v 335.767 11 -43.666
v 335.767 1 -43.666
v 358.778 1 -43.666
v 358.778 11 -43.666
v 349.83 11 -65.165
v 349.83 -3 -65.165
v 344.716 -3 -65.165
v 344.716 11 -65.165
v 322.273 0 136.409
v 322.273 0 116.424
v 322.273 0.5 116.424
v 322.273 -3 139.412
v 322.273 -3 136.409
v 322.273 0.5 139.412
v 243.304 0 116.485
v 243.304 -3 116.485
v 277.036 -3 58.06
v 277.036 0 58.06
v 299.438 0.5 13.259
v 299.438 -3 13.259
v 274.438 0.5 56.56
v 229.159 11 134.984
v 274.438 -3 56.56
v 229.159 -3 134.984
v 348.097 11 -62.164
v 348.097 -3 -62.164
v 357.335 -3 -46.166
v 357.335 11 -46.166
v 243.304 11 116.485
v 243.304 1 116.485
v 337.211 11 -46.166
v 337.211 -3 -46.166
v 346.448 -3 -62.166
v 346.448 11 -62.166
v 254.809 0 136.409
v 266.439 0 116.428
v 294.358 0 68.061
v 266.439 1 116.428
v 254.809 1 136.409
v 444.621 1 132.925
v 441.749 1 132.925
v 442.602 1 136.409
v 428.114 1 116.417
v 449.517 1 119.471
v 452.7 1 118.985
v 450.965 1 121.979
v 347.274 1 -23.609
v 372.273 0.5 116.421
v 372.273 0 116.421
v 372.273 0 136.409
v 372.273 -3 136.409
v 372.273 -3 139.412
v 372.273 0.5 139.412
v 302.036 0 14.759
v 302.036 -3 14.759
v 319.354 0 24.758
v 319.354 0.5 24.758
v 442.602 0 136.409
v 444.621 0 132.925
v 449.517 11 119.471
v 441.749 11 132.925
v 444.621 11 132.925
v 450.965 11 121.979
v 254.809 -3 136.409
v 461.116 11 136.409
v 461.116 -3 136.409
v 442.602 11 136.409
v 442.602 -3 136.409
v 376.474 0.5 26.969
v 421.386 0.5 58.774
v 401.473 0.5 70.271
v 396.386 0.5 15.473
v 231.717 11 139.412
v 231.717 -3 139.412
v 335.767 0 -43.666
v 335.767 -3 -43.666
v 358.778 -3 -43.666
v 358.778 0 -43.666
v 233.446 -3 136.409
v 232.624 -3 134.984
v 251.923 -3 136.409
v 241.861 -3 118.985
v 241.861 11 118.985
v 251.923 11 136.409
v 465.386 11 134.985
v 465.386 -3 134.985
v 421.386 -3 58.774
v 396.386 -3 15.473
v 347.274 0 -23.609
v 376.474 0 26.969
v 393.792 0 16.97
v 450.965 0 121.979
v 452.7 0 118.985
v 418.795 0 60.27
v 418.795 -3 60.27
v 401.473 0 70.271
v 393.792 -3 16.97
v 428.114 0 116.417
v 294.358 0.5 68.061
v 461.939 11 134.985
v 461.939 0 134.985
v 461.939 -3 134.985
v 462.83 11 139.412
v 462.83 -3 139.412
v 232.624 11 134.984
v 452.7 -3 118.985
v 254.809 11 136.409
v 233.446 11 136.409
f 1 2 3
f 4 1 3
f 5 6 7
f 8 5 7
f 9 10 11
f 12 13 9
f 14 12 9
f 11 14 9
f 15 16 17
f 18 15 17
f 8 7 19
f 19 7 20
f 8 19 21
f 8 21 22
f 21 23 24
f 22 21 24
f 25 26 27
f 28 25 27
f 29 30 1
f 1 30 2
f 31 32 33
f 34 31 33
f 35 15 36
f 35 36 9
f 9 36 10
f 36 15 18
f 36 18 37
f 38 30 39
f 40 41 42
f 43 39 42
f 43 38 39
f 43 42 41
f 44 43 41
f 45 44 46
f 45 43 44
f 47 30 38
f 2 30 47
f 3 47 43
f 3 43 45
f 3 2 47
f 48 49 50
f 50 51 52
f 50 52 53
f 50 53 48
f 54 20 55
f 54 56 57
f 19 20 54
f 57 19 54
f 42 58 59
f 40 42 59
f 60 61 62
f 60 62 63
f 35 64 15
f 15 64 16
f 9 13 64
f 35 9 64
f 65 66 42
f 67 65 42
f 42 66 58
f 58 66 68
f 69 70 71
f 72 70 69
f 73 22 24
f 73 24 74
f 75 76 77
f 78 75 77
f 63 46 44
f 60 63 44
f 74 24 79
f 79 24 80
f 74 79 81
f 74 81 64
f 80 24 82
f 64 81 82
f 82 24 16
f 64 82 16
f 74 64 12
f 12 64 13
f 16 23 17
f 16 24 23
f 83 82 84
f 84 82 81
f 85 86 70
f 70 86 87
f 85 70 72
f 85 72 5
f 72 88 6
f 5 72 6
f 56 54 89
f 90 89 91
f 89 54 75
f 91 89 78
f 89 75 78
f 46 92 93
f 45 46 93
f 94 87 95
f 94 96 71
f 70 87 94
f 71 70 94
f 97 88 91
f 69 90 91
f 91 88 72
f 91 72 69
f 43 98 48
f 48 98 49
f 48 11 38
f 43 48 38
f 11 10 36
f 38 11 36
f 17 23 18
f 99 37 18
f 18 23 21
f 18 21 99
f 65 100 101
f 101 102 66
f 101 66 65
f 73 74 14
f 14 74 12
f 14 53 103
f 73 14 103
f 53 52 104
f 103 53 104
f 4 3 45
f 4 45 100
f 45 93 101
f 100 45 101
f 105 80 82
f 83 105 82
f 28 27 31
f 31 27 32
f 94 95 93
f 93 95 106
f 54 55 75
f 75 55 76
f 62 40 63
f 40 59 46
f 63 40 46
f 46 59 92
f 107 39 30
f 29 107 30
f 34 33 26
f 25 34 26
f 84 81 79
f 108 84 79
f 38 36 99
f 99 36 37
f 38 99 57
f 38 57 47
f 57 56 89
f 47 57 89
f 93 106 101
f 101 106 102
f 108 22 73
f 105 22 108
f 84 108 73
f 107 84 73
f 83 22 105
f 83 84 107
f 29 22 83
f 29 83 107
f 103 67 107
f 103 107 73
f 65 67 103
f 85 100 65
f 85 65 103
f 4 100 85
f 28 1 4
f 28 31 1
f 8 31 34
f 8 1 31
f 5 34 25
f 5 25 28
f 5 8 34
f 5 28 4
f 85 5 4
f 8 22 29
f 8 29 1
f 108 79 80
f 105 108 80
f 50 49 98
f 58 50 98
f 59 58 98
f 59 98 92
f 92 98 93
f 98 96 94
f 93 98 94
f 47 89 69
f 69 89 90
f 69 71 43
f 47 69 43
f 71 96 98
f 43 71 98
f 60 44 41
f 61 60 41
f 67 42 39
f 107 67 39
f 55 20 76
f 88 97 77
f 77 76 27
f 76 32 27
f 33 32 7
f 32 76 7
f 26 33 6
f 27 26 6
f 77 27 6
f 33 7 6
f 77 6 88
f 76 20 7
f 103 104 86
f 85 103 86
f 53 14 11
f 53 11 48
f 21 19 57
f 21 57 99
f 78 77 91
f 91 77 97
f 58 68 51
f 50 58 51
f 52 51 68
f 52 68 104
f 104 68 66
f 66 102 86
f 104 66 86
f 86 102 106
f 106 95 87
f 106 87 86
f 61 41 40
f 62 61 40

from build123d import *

# Parameters (mm, degrees)
BOSS_EXTRUDE1_DEPTH      = 1
BOSS_EXTRUDE2_DEPTH      = 11
BOSS_EXTRUDE3_DEPTH      = 5
BOSS_EXTRUDE3_DEPTH_BACK = 3
SKETCH3_W                = 50
SKETCH3_H                = 7
CUT_EXTRUDE3_DEPTH       = 25
SKETCH5_W                = 50
SKETCH5_H                = 7
CUT_EXTRUDE4_DEPTH       = 25
SKETCH6_W                = 50
SKETCH6_H                = 7
CUT_EXTRUDE5_DEPTH       = 25


with BuildPart() as part:
    # Sketch1 → Boss-Extrude1 (new body)
    with BuildSketch(Plane(origin=(0, 0, 0), x_dir=(1, 0, 0), z_dir=(0, 1, 0))):
        Polygon((243.304219773, -116.484791866), (254.809280576, -136.408896139), (442.602090749, -136.409305398), (444.621046679, -132.925433223), (441.749040748, -132.925433223), (449.516726723, -119.471406457), (450.964695297, -121.978953122), (452.699916621, -118.984688017), (358.778179035, 43.666038066), (335.767496284, 43.666038066), align=None)
        Polygon((428.113670919, -116.417164681), (266.439108268, -116.428009241), (347.273609729, 23.609230825), align=None, mode=Mode.SUBTRACT)
    extrude(amount=BOSS_EXTRUDE1_DEPTH)

    # Sketch1<9> → Boss-Extrude2 (add)
    # profile 1 of 2: a face of its own
    with BuildSketch(Plane(origin=(0, 0, 0), x_dir=(1, 0, 0), z_dir=(0, 1, 0))):
        Polygon((229.159432547, -134.984249184), (231.716666588, -139.412373829), (462.829865412, -139.412373829), (465.38624875, -134.984588004), (349.829542096, 65.165499075), (344.716133219, 65.165499075), align=None)
        Polygon((251.922647988, -136.4093054), (233.446303399, -136.408896139), (232.623553959, -134.984217358), (241.860901688, -118.984688019), align=None, mode=Mode.SUBTRACT)
        Polygon((442.602090749, -136.409305398), (254.809280576, -136.408896139), (243.304219773, -116.484791866), (335.767496284, 43.666038066), (358.778179035, 43.666038066), (461.938967957, -134.984588004), (461.116393748, -136.409305398), align=None, mode=Mode.SUBTRACT)
        Polygon((348.096628302, 62.164013367), (357.334800991, 46.166038067), (337.210874326, 46.166038067), (346.44844193, 62.165948237), align=None, mode=Mode.SUBTRACT)
    # profile 2 of 2: a face of its own
    with BuildSketch(Plane(origin=(0, 0, 0), x_dir=(1, 0, 0), z_dir=(0, 1, 0))):
        Polygon((441.749040748, -132.925433223), (444.621046679, -132.925433223), (450.964695297, -121.978953122), (449.516726723, -119.471406457), align=None)
    extrude(amount=BOSS_EXTRUDE2_DEPTH)

    # Sketch1<10> → Boss-Extrude3 (add, two sides: drawn at the far end of the back side and taken through both)
    with BuildSketch(Plane(origin=(0, 0, 0), x_dir=(1, 0, 0), z_dir=(0, 1, 0)).offset(-BOSS_EXTRUDE3_DEPTH_BACK)):
        Polygon((229.159432547, -134.984249184), (231.716666588, -139.412373829), (462.829865412, -139.412373829), (465.38624875, -134.984588004), (349.829542096, 65.165499075), (344.716133219, 65.165499075), align=None)
        Polygon((251.922647988, -136.4093054), (233.446303399, -136.408896139), (232.623553959, -134.984217358), (241.860901688, -118.984688019), align=None, mode=Mode.SUBTRACT)
        Polygon((442.602090749, -136.409305398), (254.809280576, -136.408896139), (243.304219773, -116.484791866), (335.767496284, 43.666038066), (358.778179035, 43.666038066), (452.699916621, -118.984688017), (461.938967957, -134.984588004), (461.116393748, -136.409305398), align=None, mode=Mode.SUBTRACT)
        Polygon((348.096628302, 62.164013367), (357.334800991, 46.166038067), (337.210874326, 46.166038067), (346.44844193, 62.165948237), align=None, mode=Mode.SUBTRACT)
    extrude(amount=BOSS_EXTRUDE3_DEPTH + BOSS_EXTRUDE3_DEPTH_BACK)

    # Sketch3 → Cut-Extrude3 (cut)
    with BuildSketch(Plane(origin=(290.589645397, 0, -167.772009994), x_dir=(-0.49999999999998745, 0, -0.8660254037844459), z_dir=(0.8660254037844459, 0, -0.49999999999998745))):
        with Locations((-236.592990632, -3)):
            Rectangle(SKETCH3_W, SKETCH3_H)
    extrude(amount=-CUT_EXTRUDE3_DEPTH, mode=Mode.SUBTRACT)

    # Sketch5 → Cut-Extrude4 (cut)
    with BuildSketch(Plane.XY.offset(139.412373829)):
        with Locations((347.273266, -3)):
            Rectangle(SKETCH5_W, SKETCH5_H)
    extrude(amount=-CUT_EXTRUDE4_DEPTH, mode=Mode.SUBTRACT)

    # Sketch6 → Cut-Extrude5 (cut)
    with BuildSketch(Plane(origin=(230.319375797, 0, 132.975171838), x_dir=(-0.5000006154012504, 0, 0.8660250484820695), z_dir=(-0.8660250484820695, 0, -0.5000006154012504))):
        with Locations((-113.2366748, -3)):
            Rectangle(SKETCH6_W, SKETCH6_H)
    extrude(amount=-CUT_EXTRUDE5_DEPTH, mode=Mode.SUBTRACT)


solid = part.part
